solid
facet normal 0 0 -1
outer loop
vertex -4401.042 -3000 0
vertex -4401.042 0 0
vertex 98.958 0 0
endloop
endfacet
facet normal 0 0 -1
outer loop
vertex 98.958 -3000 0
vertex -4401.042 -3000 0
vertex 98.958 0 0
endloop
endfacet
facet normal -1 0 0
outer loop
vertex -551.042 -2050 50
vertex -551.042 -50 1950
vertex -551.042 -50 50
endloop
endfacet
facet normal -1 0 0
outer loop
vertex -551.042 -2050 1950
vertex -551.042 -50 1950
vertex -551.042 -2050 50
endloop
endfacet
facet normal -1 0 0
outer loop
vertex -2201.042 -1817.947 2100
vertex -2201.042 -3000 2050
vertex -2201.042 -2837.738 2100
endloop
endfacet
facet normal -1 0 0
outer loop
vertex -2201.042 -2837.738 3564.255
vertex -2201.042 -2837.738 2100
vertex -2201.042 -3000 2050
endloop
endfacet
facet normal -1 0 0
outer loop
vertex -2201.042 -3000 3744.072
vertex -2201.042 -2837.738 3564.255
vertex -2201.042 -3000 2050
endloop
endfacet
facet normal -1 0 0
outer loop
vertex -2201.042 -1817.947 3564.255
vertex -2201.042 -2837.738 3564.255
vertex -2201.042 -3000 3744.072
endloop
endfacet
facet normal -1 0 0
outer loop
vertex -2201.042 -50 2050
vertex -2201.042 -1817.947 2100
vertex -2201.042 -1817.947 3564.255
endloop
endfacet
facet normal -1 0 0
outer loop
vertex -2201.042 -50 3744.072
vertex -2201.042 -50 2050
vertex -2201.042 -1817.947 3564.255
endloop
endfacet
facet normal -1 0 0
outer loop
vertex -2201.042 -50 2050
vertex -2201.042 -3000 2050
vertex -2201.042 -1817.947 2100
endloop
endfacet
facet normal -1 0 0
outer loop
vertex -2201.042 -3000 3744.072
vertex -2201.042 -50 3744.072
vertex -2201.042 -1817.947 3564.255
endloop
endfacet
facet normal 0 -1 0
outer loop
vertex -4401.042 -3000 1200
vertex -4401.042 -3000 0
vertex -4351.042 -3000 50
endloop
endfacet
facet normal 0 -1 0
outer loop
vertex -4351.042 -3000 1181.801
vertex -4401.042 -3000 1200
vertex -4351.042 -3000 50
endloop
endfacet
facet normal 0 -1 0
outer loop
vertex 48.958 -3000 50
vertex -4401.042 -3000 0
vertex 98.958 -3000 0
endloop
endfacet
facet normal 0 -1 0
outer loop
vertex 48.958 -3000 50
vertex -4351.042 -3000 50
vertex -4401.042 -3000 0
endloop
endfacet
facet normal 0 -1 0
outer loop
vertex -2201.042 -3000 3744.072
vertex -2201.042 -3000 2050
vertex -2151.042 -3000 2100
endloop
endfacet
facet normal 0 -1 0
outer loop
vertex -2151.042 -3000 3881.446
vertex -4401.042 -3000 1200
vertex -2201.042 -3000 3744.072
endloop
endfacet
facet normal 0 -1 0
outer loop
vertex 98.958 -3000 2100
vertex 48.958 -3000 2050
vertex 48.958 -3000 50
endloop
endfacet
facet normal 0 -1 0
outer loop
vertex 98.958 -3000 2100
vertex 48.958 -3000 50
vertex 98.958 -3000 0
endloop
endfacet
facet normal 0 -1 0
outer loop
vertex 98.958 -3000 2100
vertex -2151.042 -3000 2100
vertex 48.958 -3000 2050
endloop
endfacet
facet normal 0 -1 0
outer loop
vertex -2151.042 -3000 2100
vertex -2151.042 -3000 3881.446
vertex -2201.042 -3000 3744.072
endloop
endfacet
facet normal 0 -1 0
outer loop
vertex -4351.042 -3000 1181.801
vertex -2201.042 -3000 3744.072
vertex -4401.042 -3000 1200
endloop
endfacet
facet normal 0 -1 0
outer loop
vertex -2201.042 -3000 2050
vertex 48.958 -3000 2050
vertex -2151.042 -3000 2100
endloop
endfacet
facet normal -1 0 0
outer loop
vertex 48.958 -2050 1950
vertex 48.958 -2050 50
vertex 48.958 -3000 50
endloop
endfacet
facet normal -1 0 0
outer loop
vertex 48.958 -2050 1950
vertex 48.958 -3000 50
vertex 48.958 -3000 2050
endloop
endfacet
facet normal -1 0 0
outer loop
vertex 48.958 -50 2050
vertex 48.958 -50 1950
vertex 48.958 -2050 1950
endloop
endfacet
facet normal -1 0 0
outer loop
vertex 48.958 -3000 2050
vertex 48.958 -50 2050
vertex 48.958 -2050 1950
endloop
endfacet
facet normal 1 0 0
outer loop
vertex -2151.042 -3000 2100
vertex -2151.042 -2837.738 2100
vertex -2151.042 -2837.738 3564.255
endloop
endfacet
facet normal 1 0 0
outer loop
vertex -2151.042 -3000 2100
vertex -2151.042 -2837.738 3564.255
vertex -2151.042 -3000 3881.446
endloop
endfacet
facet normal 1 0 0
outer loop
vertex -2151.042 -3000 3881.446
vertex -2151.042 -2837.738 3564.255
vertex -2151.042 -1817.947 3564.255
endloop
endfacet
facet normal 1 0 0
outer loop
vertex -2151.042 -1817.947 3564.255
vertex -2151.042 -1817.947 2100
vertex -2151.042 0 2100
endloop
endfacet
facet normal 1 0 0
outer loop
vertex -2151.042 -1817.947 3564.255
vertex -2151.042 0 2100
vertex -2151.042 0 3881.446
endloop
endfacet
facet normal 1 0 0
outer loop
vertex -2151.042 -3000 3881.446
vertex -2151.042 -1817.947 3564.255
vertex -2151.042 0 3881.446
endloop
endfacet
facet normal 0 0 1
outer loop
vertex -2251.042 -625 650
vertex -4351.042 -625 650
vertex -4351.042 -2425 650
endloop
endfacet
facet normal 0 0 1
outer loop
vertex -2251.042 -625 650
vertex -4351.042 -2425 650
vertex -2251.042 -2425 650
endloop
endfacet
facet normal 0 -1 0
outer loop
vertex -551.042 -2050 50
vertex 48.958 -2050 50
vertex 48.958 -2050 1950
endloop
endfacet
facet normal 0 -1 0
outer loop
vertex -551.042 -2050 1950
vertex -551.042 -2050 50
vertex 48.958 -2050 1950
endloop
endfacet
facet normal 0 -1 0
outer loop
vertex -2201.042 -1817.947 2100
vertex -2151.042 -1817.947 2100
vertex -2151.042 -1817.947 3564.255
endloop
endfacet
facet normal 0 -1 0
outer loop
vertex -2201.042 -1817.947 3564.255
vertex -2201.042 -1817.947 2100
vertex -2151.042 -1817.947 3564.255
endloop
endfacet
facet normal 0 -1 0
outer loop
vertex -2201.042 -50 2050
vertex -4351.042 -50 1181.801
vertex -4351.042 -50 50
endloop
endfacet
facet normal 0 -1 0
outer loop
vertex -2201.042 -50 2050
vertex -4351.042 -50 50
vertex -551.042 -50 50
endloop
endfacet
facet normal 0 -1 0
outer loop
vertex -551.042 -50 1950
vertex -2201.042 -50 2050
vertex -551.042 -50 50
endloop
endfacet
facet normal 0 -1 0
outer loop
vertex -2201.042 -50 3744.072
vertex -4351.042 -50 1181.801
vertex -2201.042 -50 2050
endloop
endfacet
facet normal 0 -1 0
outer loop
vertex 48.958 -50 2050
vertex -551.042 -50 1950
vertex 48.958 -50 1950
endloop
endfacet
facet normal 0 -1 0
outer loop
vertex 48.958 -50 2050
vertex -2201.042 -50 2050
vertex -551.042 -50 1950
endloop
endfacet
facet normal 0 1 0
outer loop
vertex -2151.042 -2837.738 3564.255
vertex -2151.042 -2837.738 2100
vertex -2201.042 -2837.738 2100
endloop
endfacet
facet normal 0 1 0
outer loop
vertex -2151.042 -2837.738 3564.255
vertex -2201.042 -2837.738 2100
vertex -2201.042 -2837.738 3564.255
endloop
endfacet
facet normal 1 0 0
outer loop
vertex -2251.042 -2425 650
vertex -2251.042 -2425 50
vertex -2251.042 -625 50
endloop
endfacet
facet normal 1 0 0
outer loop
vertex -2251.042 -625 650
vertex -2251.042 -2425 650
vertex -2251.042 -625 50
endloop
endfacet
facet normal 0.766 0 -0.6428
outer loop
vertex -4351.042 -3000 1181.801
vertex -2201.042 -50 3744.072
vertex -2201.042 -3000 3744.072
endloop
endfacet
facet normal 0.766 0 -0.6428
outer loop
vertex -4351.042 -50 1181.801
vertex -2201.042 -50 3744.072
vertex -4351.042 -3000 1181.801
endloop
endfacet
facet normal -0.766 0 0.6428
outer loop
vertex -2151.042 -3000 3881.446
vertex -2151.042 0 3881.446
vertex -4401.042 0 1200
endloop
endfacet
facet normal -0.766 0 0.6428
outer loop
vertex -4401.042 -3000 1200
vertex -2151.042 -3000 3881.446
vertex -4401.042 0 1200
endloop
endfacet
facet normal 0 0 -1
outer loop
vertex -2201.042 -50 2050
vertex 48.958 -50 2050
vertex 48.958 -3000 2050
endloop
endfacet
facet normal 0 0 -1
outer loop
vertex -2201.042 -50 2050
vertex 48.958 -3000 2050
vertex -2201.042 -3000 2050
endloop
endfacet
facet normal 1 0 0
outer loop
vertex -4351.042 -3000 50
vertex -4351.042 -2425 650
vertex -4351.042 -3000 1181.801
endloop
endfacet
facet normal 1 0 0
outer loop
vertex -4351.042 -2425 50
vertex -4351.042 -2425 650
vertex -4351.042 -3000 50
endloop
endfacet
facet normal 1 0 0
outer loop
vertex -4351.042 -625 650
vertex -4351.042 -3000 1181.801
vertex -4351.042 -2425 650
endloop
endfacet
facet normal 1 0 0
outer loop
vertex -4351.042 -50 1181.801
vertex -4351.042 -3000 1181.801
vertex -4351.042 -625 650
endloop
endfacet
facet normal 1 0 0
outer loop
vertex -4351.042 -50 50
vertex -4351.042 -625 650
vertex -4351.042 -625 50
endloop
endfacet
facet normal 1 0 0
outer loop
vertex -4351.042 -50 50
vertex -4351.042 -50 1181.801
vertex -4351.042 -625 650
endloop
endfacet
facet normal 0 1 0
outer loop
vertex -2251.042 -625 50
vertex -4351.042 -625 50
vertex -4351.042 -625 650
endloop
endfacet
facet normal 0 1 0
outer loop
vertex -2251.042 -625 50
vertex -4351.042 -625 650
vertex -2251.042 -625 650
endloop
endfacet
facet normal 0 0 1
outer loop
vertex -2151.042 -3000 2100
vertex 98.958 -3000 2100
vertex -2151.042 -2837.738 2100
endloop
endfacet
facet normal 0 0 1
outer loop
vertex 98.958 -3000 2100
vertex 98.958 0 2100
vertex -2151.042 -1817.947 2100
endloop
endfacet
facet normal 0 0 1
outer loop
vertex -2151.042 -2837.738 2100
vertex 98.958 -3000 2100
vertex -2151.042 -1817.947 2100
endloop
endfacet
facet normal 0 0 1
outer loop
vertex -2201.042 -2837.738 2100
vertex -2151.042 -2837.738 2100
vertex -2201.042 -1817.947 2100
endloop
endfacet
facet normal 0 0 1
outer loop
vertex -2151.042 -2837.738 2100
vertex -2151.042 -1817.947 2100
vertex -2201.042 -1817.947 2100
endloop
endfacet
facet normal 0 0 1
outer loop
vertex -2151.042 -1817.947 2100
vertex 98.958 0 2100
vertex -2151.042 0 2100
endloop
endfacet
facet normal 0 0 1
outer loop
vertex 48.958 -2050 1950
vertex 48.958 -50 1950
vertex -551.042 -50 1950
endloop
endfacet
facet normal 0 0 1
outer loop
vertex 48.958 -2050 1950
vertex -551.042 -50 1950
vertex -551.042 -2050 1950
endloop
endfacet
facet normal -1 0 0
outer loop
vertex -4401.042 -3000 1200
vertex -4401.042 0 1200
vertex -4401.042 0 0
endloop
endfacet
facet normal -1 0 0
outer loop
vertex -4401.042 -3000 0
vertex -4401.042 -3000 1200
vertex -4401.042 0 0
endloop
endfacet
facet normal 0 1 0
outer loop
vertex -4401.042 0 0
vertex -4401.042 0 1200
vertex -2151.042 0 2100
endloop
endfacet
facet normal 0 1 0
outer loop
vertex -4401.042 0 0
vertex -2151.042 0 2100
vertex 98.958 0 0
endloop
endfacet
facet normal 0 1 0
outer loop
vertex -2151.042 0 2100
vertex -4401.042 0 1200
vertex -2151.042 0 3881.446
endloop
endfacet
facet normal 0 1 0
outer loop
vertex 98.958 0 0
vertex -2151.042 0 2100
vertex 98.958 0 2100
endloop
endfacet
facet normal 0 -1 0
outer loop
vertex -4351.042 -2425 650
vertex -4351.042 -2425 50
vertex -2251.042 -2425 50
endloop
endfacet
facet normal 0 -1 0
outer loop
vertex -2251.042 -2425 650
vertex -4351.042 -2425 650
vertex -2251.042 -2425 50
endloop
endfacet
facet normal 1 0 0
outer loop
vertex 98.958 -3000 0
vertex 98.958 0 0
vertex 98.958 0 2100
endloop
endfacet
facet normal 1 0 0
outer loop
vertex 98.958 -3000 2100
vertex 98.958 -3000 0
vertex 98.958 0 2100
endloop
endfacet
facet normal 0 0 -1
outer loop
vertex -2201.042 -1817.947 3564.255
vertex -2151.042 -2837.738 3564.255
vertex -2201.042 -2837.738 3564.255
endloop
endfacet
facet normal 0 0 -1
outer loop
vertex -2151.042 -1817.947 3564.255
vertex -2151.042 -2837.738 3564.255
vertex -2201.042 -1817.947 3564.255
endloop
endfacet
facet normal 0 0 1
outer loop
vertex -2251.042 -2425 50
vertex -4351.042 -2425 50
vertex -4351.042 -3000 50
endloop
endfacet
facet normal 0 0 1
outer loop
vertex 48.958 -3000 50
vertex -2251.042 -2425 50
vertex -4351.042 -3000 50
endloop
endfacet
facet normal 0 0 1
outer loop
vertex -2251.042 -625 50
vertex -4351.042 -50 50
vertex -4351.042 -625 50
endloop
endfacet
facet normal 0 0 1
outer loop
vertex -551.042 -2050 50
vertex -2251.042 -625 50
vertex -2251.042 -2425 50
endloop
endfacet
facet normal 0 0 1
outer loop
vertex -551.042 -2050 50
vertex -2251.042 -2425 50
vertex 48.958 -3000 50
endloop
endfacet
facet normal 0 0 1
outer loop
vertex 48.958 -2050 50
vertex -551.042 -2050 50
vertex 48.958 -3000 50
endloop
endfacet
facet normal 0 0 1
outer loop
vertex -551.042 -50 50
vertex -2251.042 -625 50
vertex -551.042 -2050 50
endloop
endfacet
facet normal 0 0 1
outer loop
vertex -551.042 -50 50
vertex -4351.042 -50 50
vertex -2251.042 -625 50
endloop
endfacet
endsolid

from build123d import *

# Parameters (mm, degrees)
F1_DEPTH = 3000
F2_T     = -50
F3_W     = 1019.7913646698
F3_H     = 1464.2549991608
F4_DEPTH = 50
F5_W     = 2100
F5_H     = 1800
F6_DEPTH = 600
F7_W     = 2000
F7_H     = 1900
F8_DEPTH = 600


with BuildPart() as f1:
    # F0 (on Front) → F1 (new body)
    with BuildSketch(Plane.XZ):
        Polygon((-4401.0416188458, 0), (98.9583811542, 0), (98.9583811542, 2100), (-2151.0416188458, 2100), (-2151.0416188458, 3881.445583337), (-4401.0416188458, 1200), align=None)
    extrude(amount=F1_DEPTH)

    # F2
    f2_openings = [f1.faces().sort_by_distance(p)[0] for p in [
        (-2149.542304, -3000, 1235.201069),
    ]]
    offset(amount=F2_T, openings=f2_openings, kind=Kind.INTERSECTION)

    # F3 (on face) → F4 (cut, through all)
    with BuildSketch(Plane.YZ.offset(-2151.0416188458)):
        with Locations((-2327.8425931931, 2832.1274995804)):
            Rectangle(F3_W, F3_H)
    extrude(amount=-F4_DEPTH, mode=Mode.SUBTRACT)

    # F5 (on face) → F6 (join)
    with BuildSketch(Plane.XY.offset(50)):
        with Locations((-3301.0416188458, -1525)):
            Rectangle(F5_W, F5_H)
    extrude(amount=F6_DEPTH)

    # F7 (on face) → F8 (join)
    with BuildSketch(Plane(origin=(48.9583811542, 0, 0), x_dir=(0, -1, 0), z_dir=(-1, 0, 0))):
        with Locations((1050, 1000)):
            Rectangle(F7_W, F7_H)
    extrude(amount=F8_DEPTH)


solid = f1.part
